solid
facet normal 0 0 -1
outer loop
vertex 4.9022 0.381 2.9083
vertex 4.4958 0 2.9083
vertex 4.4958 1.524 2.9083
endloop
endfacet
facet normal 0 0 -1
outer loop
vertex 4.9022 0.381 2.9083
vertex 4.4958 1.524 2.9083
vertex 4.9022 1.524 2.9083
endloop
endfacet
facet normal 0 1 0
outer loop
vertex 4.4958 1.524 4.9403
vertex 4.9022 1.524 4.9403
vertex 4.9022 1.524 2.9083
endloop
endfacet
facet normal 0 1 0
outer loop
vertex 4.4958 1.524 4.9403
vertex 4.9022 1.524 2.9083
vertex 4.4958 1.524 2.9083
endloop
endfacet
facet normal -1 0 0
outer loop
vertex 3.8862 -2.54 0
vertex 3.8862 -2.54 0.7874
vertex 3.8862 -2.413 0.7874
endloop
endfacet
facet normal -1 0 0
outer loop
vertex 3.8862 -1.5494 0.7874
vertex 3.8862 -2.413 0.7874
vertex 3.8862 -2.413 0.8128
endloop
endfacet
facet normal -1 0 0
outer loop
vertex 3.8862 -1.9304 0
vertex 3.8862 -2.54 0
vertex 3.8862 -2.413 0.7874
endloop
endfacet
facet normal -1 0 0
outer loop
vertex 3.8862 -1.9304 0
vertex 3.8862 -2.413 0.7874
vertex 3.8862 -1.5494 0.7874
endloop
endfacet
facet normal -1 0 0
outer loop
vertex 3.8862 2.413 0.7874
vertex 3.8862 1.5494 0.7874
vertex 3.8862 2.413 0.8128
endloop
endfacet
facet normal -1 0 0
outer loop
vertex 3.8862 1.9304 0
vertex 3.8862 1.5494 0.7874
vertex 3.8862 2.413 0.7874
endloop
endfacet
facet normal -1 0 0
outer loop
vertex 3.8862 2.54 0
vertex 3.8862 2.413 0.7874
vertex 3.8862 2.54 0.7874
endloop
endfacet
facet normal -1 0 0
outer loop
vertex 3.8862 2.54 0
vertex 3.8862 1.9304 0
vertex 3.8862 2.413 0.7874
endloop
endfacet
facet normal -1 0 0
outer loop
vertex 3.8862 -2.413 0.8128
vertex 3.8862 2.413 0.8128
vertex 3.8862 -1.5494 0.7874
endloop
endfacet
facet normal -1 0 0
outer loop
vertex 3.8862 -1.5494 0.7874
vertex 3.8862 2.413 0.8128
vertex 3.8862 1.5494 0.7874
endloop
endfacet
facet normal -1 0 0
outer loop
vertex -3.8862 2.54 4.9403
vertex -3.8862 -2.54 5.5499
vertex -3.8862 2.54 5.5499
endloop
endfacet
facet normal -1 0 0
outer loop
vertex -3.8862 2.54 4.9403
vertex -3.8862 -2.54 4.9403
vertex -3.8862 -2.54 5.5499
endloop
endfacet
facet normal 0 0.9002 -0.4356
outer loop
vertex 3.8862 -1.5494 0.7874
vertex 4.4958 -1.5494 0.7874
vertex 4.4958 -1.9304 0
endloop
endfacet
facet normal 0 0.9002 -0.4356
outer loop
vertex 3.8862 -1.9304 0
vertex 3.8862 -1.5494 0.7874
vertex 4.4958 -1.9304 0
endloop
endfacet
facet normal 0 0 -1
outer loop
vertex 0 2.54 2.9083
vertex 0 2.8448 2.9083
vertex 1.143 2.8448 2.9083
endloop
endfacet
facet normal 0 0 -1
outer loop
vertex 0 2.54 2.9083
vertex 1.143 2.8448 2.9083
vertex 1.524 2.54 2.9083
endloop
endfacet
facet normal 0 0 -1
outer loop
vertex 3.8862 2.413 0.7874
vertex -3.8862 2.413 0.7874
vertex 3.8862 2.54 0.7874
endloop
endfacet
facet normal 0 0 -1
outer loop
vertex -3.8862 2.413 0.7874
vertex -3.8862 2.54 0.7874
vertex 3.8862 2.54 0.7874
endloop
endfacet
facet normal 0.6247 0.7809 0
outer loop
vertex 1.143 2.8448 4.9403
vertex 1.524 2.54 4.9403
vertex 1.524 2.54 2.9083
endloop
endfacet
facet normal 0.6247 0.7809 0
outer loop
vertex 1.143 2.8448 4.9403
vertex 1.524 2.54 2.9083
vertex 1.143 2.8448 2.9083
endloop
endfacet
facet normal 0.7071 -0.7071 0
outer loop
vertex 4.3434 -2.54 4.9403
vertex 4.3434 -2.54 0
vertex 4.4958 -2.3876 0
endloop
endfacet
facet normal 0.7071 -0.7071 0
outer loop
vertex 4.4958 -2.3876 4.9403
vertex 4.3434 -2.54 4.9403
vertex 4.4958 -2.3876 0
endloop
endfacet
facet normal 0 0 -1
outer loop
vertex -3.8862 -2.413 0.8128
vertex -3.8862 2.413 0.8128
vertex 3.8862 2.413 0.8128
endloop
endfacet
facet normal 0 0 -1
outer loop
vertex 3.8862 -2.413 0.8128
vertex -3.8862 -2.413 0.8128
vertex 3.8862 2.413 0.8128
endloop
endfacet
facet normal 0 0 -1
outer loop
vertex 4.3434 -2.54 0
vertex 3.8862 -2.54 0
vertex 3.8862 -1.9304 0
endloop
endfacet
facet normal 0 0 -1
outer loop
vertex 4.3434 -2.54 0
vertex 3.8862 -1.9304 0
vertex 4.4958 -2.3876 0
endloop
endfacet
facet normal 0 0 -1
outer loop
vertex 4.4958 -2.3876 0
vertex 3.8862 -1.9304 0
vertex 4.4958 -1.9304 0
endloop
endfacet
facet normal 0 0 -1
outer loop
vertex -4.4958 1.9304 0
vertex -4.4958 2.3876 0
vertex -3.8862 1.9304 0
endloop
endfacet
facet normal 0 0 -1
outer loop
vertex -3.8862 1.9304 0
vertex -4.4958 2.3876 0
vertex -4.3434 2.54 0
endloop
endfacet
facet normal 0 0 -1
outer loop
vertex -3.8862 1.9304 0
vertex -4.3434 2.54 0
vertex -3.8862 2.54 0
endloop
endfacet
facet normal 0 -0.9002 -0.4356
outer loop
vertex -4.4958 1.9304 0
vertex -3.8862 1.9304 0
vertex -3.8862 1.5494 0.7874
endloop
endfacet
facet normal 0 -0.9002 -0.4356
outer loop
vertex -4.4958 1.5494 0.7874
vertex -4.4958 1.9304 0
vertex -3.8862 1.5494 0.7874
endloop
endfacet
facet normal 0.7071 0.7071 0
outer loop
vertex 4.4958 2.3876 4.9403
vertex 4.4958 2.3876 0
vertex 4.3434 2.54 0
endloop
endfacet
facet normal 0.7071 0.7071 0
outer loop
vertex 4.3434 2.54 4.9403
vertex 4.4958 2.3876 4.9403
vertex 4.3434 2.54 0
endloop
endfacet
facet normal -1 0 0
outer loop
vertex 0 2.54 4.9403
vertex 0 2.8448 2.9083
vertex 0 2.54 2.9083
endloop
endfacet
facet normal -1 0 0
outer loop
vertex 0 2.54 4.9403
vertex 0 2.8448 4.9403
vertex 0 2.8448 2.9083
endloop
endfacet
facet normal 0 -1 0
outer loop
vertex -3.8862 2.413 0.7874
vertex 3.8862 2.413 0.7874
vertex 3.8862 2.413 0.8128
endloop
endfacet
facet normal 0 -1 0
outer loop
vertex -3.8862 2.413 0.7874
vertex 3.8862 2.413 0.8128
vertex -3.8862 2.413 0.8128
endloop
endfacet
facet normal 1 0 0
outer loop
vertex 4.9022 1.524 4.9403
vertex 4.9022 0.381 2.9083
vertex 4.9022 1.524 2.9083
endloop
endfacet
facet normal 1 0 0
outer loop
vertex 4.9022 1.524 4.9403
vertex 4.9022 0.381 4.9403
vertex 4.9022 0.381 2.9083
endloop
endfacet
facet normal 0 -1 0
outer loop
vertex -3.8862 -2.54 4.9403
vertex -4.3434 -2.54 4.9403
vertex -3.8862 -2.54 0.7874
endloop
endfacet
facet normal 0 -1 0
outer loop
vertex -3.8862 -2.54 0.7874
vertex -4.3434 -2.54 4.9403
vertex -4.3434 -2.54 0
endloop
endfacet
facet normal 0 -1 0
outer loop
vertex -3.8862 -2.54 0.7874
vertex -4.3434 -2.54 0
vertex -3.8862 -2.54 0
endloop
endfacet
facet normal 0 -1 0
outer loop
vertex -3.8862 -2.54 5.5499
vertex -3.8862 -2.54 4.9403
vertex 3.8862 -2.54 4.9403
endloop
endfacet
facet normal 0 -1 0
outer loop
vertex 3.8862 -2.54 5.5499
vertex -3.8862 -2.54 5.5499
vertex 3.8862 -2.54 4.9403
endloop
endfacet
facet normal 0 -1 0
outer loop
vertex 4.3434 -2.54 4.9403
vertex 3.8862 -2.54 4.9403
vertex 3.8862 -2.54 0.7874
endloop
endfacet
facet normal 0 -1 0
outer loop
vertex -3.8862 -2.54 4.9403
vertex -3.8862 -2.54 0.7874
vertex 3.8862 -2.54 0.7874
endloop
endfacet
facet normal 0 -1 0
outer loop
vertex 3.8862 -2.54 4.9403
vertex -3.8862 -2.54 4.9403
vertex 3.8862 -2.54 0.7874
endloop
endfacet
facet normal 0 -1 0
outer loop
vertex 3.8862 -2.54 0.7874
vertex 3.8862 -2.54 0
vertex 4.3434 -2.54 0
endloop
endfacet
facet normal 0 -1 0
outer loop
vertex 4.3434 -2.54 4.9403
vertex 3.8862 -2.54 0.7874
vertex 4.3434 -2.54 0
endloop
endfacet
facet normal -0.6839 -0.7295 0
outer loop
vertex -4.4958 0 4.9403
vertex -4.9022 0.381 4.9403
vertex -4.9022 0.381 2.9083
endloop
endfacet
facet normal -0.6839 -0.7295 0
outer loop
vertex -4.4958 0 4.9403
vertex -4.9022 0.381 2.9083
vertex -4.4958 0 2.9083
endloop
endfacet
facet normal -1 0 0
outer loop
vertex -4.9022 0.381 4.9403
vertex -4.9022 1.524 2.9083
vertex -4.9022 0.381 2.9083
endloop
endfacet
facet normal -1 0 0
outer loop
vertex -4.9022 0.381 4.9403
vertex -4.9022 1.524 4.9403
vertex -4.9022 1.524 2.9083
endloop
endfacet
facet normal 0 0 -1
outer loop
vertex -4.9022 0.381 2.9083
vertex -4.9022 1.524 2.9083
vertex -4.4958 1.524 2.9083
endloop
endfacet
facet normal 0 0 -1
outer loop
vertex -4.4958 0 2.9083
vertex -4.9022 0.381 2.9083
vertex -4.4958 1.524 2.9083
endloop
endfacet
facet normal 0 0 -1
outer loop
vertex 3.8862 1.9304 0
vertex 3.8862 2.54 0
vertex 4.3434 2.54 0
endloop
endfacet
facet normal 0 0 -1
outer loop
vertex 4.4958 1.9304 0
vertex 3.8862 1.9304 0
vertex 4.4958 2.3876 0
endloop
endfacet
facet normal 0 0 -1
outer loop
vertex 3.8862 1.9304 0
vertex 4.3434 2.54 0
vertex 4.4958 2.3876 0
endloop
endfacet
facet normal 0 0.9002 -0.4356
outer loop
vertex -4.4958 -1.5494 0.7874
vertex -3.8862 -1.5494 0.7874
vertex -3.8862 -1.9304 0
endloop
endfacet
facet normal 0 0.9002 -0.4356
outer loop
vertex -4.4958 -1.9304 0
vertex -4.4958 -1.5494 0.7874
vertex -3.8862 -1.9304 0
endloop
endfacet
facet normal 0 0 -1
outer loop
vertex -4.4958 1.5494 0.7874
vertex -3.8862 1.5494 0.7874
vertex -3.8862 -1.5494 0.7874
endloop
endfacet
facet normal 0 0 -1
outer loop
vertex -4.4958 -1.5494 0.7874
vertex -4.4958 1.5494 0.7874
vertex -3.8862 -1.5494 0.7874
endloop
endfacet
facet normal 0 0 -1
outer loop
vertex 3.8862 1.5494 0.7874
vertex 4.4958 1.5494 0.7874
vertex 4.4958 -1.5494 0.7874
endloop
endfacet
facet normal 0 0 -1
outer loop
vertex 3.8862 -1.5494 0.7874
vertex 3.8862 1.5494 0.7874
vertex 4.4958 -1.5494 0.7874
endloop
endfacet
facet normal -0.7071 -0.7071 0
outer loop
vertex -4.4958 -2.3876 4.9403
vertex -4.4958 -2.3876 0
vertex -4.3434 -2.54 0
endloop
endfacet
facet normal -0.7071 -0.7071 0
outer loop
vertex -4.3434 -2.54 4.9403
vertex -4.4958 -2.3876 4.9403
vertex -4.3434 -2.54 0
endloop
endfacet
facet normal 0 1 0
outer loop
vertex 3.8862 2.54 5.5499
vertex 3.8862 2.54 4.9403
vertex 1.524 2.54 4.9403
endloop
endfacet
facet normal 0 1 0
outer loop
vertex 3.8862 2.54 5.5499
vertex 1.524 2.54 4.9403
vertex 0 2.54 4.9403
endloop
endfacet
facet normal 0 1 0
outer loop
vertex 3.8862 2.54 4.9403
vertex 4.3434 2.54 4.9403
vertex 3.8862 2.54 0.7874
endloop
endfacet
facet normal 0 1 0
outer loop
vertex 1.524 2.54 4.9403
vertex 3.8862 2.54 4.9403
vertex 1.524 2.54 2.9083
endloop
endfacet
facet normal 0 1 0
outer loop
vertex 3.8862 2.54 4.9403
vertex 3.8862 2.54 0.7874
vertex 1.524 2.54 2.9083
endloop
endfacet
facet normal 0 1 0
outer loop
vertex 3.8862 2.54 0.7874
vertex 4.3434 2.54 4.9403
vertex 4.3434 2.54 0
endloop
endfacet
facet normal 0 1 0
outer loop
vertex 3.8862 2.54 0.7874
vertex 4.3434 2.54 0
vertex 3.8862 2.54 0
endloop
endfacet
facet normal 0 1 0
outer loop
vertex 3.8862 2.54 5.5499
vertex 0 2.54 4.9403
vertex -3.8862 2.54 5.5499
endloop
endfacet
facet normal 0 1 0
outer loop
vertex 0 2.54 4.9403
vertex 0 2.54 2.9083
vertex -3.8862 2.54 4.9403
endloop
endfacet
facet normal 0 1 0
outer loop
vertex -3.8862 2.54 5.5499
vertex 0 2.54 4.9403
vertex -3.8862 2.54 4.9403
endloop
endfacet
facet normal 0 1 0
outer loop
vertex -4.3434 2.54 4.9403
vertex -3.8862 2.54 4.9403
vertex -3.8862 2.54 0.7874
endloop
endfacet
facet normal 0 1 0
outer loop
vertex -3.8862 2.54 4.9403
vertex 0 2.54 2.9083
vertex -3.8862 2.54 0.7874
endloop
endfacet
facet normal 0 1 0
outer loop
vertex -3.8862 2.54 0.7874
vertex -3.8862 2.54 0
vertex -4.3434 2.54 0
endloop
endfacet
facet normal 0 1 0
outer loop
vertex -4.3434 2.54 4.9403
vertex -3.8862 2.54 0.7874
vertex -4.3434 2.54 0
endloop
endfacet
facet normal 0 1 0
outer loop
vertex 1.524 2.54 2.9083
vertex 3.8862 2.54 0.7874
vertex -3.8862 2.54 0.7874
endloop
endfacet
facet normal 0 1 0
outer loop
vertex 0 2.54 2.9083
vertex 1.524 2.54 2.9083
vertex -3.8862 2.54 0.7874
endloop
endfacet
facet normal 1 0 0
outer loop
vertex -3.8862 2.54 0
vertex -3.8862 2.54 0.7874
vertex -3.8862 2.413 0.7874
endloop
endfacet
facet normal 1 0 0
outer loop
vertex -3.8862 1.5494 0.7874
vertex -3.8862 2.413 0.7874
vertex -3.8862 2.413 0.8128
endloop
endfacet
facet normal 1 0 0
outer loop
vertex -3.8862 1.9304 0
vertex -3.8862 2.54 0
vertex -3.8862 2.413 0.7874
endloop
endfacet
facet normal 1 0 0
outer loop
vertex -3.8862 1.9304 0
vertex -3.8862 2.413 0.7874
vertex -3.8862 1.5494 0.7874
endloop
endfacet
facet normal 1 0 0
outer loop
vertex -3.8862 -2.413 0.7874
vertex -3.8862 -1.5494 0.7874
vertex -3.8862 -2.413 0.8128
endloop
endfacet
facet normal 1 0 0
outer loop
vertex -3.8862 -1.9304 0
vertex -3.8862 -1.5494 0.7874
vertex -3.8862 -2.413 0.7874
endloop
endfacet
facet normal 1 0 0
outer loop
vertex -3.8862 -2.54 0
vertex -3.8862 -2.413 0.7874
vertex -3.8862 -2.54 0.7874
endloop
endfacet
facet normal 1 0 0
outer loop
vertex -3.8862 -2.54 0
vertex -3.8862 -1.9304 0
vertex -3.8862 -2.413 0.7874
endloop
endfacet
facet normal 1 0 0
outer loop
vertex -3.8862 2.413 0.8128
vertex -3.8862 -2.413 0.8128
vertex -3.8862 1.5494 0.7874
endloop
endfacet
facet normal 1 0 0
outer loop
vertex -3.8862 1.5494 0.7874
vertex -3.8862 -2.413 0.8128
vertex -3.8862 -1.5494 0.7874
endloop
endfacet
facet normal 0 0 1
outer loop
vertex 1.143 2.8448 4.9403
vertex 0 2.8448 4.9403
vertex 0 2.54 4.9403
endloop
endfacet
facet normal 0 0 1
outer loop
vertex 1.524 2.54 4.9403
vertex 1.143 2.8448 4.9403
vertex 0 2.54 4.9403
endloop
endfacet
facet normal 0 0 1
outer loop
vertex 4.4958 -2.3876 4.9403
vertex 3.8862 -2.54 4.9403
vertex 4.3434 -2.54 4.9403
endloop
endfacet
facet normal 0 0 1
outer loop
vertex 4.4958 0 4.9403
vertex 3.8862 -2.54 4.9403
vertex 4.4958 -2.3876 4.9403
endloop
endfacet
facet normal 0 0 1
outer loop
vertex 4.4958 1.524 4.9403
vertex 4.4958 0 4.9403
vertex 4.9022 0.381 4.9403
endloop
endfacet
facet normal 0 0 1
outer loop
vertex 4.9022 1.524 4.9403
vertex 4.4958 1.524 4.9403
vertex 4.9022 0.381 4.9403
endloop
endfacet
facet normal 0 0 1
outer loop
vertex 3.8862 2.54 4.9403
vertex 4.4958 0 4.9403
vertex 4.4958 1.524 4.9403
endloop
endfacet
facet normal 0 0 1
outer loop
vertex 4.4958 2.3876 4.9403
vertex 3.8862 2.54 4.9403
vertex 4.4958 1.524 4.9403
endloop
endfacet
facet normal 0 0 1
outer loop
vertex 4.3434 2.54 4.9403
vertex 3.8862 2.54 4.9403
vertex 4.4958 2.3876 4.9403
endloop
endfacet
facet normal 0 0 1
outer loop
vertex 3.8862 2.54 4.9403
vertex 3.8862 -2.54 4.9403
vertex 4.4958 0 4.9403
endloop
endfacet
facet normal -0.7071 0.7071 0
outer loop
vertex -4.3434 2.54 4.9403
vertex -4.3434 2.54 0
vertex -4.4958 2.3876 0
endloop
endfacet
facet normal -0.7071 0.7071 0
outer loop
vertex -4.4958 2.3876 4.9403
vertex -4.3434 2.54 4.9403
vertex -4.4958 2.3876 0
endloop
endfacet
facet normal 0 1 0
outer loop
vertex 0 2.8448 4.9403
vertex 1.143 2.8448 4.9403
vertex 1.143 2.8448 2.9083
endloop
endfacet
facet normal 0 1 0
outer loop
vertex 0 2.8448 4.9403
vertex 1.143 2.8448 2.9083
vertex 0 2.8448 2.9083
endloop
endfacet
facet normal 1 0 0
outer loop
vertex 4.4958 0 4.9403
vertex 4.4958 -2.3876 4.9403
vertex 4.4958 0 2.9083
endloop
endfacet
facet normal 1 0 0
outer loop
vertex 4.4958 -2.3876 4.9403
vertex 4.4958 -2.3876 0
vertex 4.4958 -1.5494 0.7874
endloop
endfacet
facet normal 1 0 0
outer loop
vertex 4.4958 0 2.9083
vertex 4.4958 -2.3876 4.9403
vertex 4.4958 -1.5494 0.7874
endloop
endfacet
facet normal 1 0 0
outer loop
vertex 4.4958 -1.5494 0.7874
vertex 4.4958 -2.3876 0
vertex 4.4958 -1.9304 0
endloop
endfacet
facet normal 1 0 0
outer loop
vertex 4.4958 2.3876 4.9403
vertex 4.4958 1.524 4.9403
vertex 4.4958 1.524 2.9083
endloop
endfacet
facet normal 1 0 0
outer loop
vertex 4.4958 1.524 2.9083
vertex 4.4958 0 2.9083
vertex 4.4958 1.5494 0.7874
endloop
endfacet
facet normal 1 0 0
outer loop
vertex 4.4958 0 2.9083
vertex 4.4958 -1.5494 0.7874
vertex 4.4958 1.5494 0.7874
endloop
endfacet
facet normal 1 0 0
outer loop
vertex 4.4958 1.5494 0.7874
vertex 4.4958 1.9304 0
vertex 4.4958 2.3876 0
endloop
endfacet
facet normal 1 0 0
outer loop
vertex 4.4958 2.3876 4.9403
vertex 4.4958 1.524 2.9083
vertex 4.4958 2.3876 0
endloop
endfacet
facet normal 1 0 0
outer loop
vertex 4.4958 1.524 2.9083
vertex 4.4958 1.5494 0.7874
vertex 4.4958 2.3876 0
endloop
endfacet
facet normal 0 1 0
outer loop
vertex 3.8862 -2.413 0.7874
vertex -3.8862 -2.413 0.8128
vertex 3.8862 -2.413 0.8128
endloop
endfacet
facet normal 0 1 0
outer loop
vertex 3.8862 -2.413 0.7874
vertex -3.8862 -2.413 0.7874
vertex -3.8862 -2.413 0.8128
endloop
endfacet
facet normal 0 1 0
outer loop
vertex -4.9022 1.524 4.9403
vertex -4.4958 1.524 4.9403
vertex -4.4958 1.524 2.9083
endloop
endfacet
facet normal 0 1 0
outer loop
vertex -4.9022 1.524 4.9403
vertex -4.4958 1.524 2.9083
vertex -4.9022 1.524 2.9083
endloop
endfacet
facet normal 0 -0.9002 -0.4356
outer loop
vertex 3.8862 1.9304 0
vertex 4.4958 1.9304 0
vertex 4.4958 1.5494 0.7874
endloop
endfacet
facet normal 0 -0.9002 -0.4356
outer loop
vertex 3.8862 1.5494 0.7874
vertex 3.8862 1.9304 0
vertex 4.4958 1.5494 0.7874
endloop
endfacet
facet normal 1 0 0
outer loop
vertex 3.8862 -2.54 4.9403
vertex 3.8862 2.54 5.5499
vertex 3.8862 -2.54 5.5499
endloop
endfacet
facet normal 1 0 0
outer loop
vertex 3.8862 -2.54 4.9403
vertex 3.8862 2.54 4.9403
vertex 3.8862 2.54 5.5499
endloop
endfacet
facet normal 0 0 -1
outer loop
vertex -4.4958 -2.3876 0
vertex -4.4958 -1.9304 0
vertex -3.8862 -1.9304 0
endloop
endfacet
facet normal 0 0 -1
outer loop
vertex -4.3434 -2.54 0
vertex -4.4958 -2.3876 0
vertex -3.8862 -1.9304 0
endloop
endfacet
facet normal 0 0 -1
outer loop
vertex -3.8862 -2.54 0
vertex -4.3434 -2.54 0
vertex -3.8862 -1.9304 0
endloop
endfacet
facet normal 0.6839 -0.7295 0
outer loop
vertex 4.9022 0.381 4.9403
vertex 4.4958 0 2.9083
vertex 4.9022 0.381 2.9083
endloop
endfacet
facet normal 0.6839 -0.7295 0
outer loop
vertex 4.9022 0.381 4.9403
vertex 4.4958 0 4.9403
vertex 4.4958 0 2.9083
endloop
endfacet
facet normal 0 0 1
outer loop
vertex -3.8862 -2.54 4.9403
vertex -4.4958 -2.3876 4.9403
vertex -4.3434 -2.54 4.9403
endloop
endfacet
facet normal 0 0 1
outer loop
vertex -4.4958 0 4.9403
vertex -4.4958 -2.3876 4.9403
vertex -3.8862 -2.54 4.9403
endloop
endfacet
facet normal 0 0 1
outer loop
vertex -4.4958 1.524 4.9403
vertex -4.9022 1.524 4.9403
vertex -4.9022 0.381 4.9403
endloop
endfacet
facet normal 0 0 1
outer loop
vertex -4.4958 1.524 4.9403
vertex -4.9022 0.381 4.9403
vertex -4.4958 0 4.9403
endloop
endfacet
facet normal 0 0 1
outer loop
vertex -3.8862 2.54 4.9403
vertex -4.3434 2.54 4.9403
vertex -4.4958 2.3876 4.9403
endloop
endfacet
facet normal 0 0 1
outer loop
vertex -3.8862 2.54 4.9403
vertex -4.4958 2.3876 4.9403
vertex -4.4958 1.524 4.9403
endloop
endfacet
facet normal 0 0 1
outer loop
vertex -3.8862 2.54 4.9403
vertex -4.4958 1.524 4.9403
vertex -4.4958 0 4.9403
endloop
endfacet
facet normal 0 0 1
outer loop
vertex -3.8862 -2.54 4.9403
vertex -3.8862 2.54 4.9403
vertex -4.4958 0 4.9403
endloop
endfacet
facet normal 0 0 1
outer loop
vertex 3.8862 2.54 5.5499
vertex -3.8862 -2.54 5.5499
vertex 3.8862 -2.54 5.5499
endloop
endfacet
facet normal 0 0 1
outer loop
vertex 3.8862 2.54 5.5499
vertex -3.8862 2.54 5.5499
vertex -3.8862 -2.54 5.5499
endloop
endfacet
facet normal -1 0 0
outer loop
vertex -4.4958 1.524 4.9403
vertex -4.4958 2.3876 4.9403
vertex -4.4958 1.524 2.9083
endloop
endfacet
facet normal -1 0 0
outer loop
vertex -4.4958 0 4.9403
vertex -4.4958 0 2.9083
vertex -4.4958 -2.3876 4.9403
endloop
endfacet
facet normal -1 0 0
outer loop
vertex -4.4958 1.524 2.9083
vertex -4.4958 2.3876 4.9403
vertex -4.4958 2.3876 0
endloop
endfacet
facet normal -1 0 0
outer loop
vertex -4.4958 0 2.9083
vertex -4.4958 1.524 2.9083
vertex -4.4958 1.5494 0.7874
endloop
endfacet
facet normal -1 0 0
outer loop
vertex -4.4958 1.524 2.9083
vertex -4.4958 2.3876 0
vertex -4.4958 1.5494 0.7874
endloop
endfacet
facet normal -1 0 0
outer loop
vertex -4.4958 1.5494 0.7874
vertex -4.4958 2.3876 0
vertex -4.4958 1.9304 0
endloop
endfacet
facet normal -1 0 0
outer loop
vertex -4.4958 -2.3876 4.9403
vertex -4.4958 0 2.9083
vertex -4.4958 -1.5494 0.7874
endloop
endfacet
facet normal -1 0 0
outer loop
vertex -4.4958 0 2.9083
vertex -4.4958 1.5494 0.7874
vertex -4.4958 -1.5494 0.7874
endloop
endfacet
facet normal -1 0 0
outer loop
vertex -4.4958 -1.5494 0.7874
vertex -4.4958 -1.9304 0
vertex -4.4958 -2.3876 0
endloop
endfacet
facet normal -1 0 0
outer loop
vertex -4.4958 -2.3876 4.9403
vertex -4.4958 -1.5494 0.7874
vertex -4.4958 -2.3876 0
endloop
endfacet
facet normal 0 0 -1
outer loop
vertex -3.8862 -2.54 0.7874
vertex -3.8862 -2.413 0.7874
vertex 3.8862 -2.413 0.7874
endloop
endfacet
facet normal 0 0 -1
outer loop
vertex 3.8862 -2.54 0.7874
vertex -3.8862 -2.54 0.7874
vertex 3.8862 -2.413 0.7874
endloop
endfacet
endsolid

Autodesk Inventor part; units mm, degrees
sketch "Sketch_1" plane through (0, 0, 0) normal (0, 0, 1) x (1, 0, 0)
  line L0 (-4.4958, -2.3876) -> (-4.3434, -2.54)
  line L1 (-4.3434, -2.54) -> (4.3434, -2.54)
  line L2 (4.3434, -2.54) -> (4.4958, -2.3876)
  line L3 (4.4958, -2.3876) -> (4.4958, 2.3876)
  line L4 (4.4958, 2.3876) -> (4.3434, 2.54)
  line L5 (4.3434, 2.54) -> (-4.3434, 2.54)
  line L6 (-4.3434, 2.54) -> (-4.4958, 2.3876)
  line L7 (-4.4958, 2.3876) -> (-4.4958, -2.3876)
extrude "Extrusion1" add sketch "Sketch_1" along normal blind 5.5499
sketch "Sketch_2" plane through (0, 0, 0) normal (0, 0, 1) x (1, 0, 0)
  line L0 (-3.8862, 2.54) -> (-3.8862, -2.54)
  line L1 (-3.8862, -2.54) -> (3.8862, -2.54)
  line L2 (3.8862, -2.54) -> (3.8862, 2.54)
  line L3 (3.8862, 2.54) -> (-3.8862, 2.54)
extrude "Extrusion2" cut sketch "Sketch_2" along normal blind 0.7874
sketch "Sketch_14" plane through (0, 0, 0.7874) normal (0, 0, 1) x (1, 0, 0)
  line L0 (-3.8862, 2.413) -> (-3.8862, -2.413)
  line L1 (-3.8862, -2.413) -> (3.8862, -2.413)
  line L2 (3.8862, -2.413) -> (3.8862, 2.413)
  line L3 (3.8862, 2.413) -> (-3.8862, 2.413)
extrude "Extrusion3" cut sketch "Sketch_14" along normal blind 0.0254
sketch "Sketch_3" plane through (4.4958, 0, 0) normal (1, 0, 0) x (0, 0, -1)
  line L0 (-0.7874, 1.5494) -> (-0.7874, -1.5494)
  line L1 (-0.7874, -1.5494) -> (0, -1.9304)
  line L2 (0, -1.9304) -> (0, 1.9304)
  line L3 (0, 1.9304) -> (-0.7874, 1.5494)
extrude "Extrusion4" cut sketch "Sketch_3" against normal blind 8.9916
sketch "Sketch_4" plane through (0, 0, 4.9403) normal (0, 0, 1) x (1, 0, 0)
  line L0 (3.8862, 2.54) -> (3.8862, -2.54)
  line L1 (3.8862, -2.54) -> (4.4958, -2.54)
  line L2 (4.4958, -2.54) -> (4.4958, 2.54)
  line L3 (4.4958, 2.54) -> (3.8862, 2.54)
extrude "Extrusion5" cut sketch "Sketch_4" along normal blind 0.6096
sketch "Sketch_5" plane through (0, 0, 4.9403) normal (0, 0, 1) x (1, 0, 0)
  line L0 (-4.4958, 2.54) -> (-4.4958, -2.54)
  line L1 (-4.4958, -2.54) -> (-3.8862, -2.54)
  line L2 (-3.8862, -2.54) -> (-3.8862, 2.54)
  line L3 (-3.8862, 2.54) -> (-4.4958, 2.54)
extrude "Extrusion6" cut sketch "Sketch_5" along normal blind 0.6096
sketch "Sketch_6" plane through (0, 0, 4.9403) normal (0, 0, 1) x (1, 0, 0)
  line L0 (4.4958, 0) -> (4.9022, 0.381)
  line L1 (4.9022, 0.381) -> (4.9022, 1.524)
  line L2 (4.9022, 1.524) -> (4.4958, 1.524)
  line L3 (4.4958, 1.524) -> (4.4958, 0)
extrude "Extrusion7" add sketch "Sketch_6" against normal blind 2.032
sketch "Sketch_7" plane through (0, 0, 4.9403) normal (0, 0, 1) x (1, 0, 0)
  line L0 (-4.9022, 0.381) -> (-4.4958, 0)
  line L1 (-4.4958, 0) -> (-4.4958, 1.524)
  line L2 (-4.4958, 1.524) -> (-4.9022, 1.524)
  line L3 (-4.9022, 1.524) -> (-4.9022, 0.381)
extrude "Extrusion8" add sketch "Sketch_7" against normal blind 2.032
sketch "Sketch_8" plane through (0, 0, 4.9403) normal (0, 0, 1) x (1, 0, 0)
  line L0 (0, 2.8448) -> (0, 2.54)
  line L1 (0, 2.54) -> (1.524, 2.54)
  line L2 (1.524, 2.54) -> (1.143, 2.8448)
  line L3 (1.143, 2.8448) -> (0, 2.8448)
extrude "Extrusion9" add sketch "Sketch_8" against normal blind 2.032
ref_plane "body1_right_XY" through (0, 0, 5.5499) normal (0, 0, -1) x (1, 0, 0)
ref_plane "body1_right_YZ" through (0, 0, 5.5499) normal (1, 0, 0) x (0, -1, 0)
ref_plane "body1_right_ZX" through (0, 0, 5.5499) normal (0, -1, 0) x (0, 0, -1)
ref_plane "cp_bracker_right_XY" through (0, -2.54, 4.9403) normal (0, 1, 0) x (1, 0, 0)
ref_plane "cp_bracker_right_YZ" through (0, -2.54, 4.9403) normal (1, 0, 0) x (0, 0, -1)
ref_plane "cp_bracker_right_ZX" through (0, -2.54, 4.9403) normal (0, 0, -1) x (0, 1, 0)
ref_plane "dummy_right_XY" through (-4.4958, -2.54, 0) normal (0, 1, 0) x (1, 0, 0)
ref_plane "dummy_right_YZ" through (-4.4958, -2.54, 0) normal (1, 0, 0) x (0, 0, -1)
ref_plane "dummy_right_ZX" through (-4.4958, -2.54, 0) normal (0, 0, -1) x (0, 1, 0)
ref_plane "terminal_h_XY" through (0, 0, 0.8636) normal (0, 0, 1) x (1, 0, 0)
ref_plane "terminal_h_YZ" through (0, 0, 0.8636) normal (1, 0, 0) x (0, 1, 0)
ref_plane "terminal_h_ZX" through (0, 0, 0.8636) normal (0, 1, 0) x (0, 0, 1)
properties part number "AS11CHright12"
